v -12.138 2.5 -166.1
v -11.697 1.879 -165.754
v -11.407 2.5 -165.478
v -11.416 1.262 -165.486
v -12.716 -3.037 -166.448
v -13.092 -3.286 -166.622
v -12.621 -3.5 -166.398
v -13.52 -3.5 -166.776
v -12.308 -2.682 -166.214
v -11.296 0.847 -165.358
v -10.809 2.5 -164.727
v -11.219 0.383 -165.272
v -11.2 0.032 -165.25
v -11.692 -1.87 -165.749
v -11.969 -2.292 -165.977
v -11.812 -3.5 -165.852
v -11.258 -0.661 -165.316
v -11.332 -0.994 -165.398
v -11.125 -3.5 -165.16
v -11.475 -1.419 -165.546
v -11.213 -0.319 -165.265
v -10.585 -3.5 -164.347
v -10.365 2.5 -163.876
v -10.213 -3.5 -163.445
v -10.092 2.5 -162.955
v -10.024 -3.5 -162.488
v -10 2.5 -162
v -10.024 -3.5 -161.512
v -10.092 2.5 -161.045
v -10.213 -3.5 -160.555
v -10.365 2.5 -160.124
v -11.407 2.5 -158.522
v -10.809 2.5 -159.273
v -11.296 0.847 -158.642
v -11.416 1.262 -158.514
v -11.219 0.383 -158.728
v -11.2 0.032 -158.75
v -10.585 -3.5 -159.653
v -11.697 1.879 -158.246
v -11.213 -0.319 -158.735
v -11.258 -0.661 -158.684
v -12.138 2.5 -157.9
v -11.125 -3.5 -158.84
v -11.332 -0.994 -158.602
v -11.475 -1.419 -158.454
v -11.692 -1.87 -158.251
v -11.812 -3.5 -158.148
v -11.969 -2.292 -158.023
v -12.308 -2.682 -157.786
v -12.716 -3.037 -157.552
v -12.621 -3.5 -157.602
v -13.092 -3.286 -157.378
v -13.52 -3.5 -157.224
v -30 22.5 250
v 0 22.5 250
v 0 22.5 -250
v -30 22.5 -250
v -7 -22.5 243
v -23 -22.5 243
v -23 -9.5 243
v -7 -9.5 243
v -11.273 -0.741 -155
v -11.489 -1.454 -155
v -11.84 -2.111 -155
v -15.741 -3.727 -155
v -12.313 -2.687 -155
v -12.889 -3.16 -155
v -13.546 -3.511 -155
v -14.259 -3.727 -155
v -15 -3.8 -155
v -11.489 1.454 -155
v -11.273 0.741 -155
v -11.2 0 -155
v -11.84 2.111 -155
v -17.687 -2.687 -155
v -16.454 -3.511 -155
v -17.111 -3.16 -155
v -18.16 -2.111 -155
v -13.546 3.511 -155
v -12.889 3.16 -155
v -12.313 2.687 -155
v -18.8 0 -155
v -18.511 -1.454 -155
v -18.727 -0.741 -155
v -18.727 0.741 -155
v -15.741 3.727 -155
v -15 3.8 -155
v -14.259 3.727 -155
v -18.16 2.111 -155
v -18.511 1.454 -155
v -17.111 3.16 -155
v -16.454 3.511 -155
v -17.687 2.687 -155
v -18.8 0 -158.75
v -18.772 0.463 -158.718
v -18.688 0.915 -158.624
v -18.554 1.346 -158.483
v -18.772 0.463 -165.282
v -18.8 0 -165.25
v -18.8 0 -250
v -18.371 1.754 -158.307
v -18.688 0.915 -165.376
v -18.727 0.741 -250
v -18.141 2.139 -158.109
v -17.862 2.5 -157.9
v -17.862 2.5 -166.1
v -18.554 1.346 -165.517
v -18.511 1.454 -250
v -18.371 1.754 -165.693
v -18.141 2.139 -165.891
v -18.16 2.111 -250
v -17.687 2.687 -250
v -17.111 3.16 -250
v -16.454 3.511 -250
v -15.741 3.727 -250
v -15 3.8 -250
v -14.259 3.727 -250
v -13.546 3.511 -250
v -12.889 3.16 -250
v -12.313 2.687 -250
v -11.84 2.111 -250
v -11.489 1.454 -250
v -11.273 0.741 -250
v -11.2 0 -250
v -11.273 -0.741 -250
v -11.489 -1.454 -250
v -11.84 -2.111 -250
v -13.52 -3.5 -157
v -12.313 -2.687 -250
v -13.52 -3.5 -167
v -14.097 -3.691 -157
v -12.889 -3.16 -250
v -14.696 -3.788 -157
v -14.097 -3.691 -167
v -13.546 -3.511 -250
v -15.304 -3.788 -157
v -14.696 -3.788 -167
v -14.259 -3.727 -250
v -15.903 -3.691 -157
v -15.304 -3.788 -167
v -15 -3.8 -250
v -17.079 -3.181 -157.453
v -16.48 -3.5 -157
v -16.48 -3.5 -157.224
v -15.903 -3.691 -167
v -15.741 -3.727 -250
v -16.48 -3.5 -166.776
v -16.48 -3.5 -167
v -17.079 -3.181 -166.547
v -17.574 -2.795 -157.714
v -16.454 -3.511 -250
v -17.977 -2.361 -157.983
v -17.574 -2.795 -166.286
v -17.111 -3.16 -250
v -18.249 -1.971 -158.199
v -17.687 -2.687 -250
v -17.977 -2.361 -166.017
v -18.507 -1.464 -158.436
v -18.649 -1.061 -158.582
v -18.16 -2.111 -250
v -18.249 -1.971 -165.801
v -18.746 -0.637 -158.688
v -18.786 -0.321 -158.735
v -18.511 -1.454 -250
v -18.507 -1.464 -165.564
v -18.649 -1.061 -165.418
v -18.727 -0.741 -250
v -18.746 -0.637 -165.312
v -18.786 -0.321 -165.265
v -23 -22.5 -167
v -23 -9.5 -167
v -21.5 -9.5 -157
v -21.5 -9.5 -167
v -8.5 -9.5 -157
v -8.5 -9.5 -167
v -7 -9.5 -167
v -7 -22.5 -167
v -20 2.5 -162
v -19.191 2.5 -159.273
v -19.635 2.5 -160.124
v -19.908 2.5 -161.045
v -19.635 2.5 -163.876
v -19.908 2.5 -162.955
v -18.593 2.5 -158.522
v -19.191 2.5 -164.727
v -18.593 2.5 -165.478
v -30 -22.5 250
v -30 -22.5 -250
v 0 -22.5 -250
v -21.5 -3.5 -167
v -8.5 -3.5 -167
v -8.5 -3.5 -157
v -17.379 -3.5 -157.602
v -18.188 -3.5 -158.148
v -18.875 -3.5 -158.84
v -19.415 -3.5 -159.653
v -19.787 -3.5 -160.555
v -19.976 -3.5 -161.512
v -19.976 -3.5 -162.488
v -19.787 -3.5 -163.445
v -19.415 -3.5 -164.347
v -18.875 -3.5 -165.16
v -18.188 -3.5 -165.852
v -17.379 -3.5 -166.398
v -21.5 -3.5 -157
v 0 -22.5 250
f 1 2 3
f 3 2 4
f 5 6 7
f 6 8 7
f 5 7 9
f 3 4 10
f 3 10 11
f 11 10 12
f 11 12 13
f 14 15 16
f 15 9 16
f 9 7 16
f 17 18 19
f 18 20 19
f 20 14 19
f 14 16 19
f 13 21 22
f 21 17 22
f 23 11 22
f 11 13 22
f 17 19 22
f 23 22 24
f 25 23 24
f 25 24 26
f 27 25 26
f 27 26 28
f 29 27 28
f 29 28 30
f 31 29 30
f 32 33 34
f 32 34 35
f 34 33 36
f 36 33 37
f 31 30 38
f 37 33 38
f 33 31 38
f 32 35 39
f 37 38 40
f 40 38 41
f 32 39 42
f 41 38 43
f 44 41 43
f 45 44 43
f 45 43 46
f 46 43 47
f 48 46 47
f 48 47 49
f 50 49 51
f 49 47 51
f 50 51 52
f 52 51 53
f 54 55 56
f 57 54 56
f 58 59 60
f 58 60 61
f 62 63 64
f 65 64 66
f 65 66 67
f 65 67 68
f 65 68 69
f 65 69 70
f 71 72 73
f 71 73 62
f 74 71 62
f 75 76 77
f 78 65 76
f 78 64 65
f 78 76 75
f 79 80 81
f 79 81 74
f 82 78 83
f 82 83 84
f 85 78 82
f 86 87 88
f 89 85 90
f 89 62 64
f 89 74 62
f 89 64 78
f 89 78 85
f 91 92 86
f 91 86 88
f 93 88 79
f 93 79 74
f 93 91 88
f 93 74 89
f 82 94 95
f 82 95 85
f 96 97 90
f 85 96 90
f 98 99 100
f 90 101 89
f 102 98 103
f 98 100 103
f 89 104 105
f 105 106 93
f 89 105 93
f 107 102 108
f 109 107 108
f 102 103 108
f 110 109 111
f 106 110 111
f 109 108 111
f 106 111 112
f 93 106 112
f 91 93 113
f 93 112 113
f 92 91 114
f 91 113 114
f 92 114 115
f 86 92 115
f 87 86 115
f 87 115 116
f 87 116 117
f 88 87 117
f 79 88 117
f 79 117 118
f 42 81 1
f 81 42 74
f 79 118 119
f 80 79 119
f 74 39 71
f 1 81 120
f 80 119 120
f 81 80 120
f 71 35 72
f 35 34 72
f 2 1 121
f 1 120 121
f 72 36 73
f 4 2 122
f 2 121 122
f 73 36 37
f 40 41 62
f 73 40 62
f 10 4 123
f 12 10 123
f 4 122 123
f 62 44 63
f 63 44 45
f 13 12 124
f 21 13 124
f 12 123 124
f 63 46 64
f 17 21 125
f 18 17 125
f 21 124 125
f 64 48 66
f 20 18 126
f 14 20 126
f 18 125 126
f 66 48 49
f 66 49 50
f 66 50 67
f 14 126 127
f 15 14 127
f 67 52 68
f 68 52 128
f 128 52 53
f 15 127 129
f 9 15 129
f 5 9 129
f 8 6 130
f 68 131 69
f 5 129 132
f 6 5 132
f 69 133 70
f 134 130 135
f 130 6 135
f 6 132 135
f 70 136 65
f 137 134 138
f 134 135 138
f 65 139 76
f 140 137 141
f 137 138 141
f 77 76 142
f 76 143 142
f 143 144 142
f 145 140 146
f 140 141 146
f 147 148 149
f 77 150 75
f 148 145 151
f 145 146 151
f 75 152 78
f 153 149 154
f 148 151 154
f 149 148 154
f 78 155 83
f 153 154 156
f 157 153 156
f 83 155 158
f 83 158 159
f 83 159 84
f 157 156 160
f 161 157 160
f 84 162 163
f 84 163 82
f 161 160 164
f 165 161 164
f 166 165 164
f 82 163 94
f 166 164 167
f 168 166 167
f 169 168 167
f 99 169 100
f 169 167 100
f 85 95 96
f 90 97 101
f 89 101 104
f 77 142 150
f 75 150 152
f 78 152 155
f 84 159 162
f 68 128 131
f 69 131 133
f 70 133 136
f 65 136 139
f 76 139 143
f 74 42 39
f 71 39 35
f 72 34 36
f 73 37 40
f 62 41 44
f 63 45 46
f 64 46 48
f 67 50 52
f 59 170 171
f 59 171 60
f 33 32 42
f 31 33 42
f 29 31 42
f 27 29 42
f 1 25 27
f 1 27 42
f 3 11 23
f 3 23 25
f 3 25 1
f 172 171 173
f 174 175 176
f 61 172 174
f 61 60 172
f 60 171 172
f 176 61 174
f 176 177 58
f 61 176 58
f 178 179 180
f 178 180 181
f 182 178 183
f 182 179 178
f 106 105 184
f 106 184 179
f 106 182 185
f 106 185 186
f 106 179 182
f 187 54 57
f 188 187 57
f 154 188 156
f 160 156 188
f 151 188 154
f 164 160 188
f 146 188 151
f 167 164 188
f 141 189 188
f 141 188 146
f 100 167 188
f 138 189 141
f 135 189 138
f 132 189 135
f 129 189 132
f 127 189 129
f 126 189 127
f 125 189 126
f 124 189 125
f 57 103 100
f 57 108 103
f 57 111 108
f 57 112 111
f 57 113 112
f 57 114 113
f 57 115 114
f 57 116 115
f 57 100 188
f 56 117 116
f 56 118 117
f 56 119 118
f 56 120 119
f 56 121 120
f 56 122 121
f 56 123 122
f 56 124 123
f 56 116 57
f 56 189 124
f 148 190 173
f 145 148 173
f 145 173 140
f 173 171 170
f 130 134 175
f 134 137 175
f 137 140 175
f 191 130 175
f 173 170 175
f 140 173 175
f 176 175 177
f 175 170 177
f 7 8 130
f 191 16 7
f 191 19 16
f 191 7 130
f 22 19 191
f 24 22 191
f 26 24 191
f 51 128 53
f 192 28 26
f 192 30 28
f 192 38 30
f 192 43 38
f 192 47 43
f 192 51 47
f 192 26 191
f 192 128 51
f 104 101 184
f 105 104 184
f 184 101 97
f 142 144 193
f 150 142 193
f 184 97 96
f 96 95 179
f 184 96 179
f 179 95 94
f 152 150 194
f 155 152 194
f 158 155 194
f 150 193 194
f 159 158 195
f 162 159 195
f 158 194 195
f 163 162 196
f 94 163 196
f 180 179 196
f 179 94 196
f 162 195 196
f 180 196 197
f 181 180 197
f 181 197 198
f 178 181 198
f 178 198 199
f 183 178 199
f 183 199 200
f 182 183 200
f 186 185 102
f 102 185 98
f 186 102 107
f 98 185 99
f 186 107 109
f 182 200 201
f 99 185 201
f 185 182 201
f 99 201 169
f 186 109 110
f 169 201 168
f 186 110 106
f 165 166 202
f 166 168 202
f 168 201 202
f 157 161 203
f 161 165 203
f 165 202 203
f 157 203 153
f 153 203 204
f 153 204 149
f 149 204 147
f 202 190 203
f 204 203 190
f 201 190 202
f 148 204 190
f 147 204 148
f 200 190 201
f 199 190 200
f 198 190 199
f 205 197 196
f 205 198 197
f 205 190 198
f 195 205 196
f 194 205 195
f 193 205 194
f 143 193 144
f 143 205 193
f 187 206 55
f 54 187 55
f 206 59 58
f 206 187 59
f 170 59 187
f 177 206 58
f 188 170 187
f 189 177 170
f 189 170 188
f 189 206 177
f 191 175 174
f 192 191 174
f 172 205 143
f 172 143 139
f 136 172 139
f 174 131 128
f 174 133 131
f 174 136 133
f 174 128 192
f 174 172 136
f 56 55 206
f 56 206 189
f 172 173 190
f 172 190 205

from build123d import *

# Parameters (mm, degrees)
SKETCH1_W           = 500
SKETCH1_H           = 45
BOSS_EXTRUDE1_DEPTH = 30
SKETCH2_W           = 16
SKETCH2_H           = 410
CUT_EXTRUDE1_DEPTH  = 13
SKETCH3_R           = 3.8
CUT_EXTRUDE2_DEPTH  = 95
SKETCH4_R           = 5
CUT_EXTRUDE3_DEPTH  = 12
SKETCH5_W           = 13
SKETCH5_H           = 10
CUT_EXTRUDE4_DEPTH  = 6


with BuildPart() as part:
    # Sketch1 → Boss-Extrude1 (new body)
    with BuildSketch(Plane(origin=(0, 0, 0), x_dir=(0, 0, -1), z_dir=(1, 0, 0))):
        Rectangle(SKETCH1_W, SKETCH1_H)
    extrude(amount=-BOSS_EXTRUDE1_DEPTH)

    # Sketch2 → Cut-Extrude1 (cut)
    with BuildSketch(Plane.XZ.offset(22.5)):
        with Locations((-15, 38)):
            Rectangle(SKETCH2_W, SKETCH2_H)
    extrude(amount=-CUT_EXTRUDE1_DEPTH, mode=Mode.SUBTRACT)

    # Sketch3 → Cut-Extrude2 (cut)
    with BuildSketch(Plane(origin=(0, 0, -250), x_dir=(-1, 0, 0), z_dir=(0, 0, -1))):
        with Locations((15, 0)):
            Circle(SKETCH3_R)
    extrude(amount=-CUT_EXTRUDE2_DEPTH, mode=Mode.SUBTRACT)

    # Sketch4 → Cut-Extrude3 (cut)
    with BuildSketch(Plane.XZ.offset(9.5)):
        with Locations(Location((-15, -162, 0), (0, 0, 270))):
            Circle(SKETCH4_R)
    extrude(amount=-CUT_EXTRUDE3_DEPTH, mode=Mode.SUBTRACT)

    # Sketch5 → Cut-Extrude4 (cut)
    with BuildSketch(Plane.XZ.offset(9.5)):
        with Locations((-15, -162)):
            Rectangle(SKETCH5_W, SKETCH5_H)
    extrude(amount=-CUT_EXTRUDE4_DEPTH, mode=Mode.SUBTRACT)


solid = part.part
